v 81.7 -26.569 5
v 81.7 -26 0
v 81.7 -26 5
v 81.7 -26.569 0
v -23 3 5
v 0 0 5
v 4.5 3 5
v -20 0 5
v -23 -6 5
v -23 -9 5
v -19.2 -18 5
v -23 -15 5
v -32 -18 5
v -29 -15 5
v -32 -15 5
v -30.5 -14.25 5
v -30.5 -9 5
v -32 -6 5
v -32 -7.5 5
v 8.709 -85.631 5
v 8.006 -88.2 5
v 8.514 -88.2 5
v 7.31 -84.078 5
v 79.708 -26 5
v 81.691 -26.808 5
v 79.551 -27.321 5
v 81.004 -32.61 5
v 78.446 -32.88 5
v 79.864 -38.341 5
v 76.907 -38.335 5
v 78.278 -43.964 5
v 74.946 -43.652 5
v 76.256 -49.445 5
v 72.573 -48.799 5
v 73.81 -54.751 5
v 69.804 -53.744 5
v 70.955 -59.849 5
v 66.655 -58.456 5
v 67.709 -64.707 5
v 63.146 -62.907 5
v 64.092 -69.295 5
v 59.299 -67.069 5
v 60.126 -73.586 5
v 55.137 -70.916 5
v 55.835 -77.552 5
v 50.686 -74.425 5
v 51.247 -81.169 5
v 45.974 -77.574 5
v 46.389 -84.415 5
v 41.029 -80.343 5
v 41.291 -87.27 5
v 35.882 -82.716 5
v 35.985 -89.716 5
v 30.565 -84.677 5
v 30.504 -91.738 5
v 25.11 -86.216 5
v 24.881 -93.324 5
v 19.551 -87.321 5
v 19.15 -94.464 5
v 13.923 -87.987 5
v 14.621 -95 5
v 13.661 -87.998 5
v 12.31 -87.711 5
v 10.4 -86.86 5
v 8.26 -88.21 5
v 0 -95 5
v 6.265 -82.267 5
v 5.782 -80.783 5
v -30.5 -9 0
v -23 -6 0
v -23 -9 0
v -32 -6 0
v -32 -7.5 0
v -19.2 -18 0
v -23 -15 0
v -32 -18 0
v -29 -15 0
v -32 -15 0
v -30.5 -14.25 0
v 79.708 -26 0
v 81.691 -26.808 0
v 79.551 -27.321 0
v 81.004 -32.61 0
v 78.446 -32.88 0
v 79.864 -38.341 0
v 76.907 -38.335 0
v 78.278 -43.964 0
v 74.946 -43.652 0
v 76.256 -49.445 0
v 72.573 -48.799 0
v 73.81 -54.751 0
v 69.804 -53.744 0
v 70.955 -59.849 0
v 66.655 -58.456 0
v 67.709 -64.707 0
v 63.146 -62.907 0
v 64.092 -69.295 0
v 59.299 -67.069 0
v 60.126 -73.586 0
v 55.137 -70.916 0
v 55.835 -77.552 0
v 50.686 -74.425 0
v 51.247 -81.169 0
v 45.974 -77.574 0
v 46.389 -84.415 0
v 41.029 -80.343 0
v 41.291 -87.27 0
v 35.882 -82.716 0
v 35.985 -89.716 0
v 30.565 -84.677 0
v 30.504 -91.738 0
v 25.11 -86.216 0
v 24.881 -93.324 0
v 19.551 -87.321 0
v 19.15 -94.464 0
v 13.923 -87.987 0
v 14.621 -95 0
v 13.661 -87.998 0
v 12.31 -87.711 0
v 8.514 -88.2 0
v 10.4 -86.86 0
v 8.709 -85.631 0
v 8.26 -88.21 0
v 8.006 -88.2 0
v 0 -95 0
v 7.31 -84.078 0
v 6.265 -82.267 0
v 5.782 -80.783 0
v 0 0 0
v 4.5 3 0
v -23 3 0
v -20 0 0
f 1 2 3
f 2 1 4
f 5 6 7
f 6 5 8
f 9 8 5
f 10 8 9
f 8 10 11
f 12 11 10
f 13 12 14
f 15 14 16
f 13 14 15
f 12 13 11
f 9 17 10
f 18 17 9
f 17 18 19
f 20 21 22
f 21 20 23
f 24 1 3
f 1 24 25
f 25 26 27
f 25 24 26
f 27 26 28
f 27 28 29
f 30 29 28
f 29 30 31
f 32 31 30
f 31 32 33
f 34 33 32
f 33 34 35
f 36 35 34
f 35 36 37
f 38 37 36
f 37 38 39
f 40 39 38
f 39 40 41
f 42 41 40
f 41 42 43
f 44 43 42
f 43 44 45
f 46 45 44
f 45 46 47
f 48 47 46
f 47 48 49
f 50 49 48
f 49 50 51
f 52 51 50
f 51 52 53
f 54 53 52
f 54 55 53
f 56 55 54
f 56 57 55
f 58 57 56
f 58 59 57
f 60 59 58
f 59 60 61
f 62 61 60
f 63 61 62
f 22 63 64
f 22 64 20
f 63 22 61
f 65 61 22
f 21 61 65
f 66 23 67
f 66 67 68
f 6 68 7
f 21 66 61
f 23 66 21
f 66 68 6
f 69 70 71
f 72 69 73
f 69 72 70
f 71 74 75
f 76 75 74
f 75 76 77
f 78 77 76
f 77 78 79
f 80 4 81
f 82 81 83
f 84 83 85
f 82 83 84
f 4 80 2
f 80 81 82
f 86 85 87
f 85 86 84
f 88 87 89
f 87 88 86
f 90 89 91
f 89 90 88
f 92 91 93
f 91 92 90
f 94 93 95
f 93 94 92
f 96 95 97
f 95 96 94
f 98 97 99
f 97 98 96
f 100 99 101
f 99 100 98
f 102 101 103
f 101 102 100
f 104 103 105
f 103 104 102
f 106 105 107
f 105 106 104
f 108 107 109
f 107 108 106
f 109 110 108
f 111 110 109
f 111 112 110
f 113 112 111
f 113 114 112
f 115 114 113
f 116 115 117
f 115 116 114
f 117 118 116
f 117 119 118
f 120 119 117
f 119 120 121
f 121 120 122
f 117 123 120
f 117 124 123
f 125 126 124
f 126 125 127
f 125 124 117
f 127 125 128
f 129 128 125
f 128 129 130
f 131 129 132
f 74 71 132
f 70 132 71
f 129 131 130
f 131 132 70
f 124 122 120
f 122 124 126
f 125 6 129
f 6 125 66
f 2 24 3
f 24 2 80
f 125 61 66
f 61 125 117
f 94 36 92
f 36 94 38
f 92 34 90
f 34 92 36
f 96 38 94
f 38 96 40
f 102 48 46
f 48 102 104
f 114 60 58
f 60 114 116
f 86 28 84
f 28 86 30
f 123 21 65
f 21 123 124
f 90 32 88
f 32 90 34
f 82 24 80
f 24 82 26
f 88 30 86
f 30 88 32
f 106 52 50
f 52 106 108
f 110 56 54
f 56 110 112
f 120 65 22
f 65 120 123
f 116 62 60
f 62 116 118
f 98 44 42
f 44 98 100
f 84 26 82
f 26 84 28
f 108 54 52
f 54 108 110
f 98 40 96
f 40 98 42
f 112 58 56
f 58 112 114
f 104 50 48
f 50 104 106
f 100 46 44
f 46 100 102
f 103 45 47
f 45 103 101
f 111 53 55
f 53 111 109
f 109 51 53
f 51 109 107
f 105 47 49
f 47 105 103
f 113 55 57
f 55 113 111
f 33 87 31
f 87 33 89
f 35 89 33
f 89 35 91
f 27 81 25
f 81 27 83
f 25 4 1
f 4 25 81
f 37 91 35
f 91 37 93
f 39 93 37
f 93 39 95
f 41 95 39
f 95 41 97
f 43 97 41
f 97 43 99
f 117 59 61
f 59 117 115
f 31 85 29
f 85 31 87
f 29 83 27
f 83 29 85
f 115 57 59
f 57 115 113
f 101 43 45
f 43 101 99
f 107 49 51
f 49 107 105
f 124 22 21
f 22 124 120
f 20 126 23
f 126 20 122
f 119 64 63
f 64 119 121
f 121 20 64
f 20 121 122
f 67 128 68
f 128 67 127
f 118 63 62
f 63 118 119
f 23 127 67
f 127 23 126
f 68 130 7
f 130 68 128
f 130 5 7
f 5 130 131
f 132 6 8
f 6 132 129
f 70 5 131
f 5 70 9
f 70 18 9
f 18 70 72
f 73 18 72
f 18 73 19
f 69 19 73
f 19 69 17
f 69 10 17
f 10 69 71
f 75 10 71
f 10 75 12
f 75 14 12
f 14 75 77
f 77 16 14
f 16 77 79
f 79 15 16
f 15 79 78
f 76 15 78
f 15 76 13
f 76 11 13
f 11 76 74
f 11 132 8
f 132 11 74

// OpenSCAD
// [FL_INDEX: keywords="openscad, 3d_parametric, Hayrack, csg_solid" | COT="Parametric OpenSCAD design from 3DCodeverse"]
// Title: Hayrack

// Height from top of wall to bottom of hayrack
main_height = 95;

// Thickness of wall where rack will be mounted
wall_width = 20;

// Height of wooden bar
bar_height = 6;

// Width of wooden bar
bar_width = 6;

// Length of wooden bar fixation
fixation_height = 18;

// Thickness
depth = 5;

/* [Hidden] */
fixation_width=3;

module fixation () {
  linear_extrude(height=depth)polygon(points=[
	[0,0],
	[-wall_width,0],
   [-wall_width+0.8, -fixation_height],
   [-wall_width-fixation_width-bar_width-fixation_width,-fixation_height],
   [-wall_width-fixation_width-bar_width-fixation_width,-fixation_height+fixation_width],
   [-wall_width-fixation_width-bar_width-fixation_width/2, -fixation_height+fixation_width+fixation_width*0.25],
   [-wall_width-fixation_width-bar_width,-fixation_height+fixation_width],
   [-wall_width-fixation_width,-fixation_height+fixation_width], // Point 8
   [-wall_width-fixation_width,-fixation_height+fixation_width+bar_height],
   [-wall_width-fixation_width-bar_width-fixation_width/2,-fixation_height+fixation_width+bar_height],
   [-wall_width-fixation_width-bar_width-fixation_width,-fixation_height+fixation_width+bar_height+fixation_width/2],
   [-wall_width-fixation_width-bar_width-fixation_width,-fixation_height+fixation_width+bar_height+fixation_width],
   [-wall_width-fixation_width,-fixation_height+2*fixation_width+bar_height],
   [-wall_width-fixation_width,fixation_width],
   [0, fixation_width],
]);
}



module rack () {
  lower_curve_radius = 10;
  lower_curve_center = [fixation_width*1.8+lower_curve_radius,-main_height+16.8,0];
  inner_hook_center = [8.26,-main_height+78.97,0];
  inner_hook_radius = 72.18;
  outer_hook_center = [7.51, -main_height+74.03,0];
  outer_hook_radius = 74.41; 

  hook_x = 81.7;
  hook_y = 69; //main_height - 26.2;

  linear_extrude(height=depth)polygon(points=[
	[0,fixation_width],
   [0,-main_height],
   [fixation_width*2,-main_height],
   [fixation_width*1.5,fixation_width]
]);

  intersection(){
    difference() {
      translate([0,-main_height,0])cube([hook_x, hook_y, depth]);
        
      translate([0,0,-0.5])translate(inner_hook_center)cylinder(r=inner_hook_radius,depth+1, $fn=80);
    }
    translate(outer_hook_center)cylinder(r=outer_hook_radius, depth, $fn=80);
  }
  translate(lower_curve_center)difference(){
    translate([-lower_curve_radius,-lower_curve_radius,0])cube([lower_curve_radius,lower_curve_radius,depth]);
    translate([0,0,-0.5])cylinder(r=lower_curve_radius, h=depth+1);
  }
}



fixation();
rack();
